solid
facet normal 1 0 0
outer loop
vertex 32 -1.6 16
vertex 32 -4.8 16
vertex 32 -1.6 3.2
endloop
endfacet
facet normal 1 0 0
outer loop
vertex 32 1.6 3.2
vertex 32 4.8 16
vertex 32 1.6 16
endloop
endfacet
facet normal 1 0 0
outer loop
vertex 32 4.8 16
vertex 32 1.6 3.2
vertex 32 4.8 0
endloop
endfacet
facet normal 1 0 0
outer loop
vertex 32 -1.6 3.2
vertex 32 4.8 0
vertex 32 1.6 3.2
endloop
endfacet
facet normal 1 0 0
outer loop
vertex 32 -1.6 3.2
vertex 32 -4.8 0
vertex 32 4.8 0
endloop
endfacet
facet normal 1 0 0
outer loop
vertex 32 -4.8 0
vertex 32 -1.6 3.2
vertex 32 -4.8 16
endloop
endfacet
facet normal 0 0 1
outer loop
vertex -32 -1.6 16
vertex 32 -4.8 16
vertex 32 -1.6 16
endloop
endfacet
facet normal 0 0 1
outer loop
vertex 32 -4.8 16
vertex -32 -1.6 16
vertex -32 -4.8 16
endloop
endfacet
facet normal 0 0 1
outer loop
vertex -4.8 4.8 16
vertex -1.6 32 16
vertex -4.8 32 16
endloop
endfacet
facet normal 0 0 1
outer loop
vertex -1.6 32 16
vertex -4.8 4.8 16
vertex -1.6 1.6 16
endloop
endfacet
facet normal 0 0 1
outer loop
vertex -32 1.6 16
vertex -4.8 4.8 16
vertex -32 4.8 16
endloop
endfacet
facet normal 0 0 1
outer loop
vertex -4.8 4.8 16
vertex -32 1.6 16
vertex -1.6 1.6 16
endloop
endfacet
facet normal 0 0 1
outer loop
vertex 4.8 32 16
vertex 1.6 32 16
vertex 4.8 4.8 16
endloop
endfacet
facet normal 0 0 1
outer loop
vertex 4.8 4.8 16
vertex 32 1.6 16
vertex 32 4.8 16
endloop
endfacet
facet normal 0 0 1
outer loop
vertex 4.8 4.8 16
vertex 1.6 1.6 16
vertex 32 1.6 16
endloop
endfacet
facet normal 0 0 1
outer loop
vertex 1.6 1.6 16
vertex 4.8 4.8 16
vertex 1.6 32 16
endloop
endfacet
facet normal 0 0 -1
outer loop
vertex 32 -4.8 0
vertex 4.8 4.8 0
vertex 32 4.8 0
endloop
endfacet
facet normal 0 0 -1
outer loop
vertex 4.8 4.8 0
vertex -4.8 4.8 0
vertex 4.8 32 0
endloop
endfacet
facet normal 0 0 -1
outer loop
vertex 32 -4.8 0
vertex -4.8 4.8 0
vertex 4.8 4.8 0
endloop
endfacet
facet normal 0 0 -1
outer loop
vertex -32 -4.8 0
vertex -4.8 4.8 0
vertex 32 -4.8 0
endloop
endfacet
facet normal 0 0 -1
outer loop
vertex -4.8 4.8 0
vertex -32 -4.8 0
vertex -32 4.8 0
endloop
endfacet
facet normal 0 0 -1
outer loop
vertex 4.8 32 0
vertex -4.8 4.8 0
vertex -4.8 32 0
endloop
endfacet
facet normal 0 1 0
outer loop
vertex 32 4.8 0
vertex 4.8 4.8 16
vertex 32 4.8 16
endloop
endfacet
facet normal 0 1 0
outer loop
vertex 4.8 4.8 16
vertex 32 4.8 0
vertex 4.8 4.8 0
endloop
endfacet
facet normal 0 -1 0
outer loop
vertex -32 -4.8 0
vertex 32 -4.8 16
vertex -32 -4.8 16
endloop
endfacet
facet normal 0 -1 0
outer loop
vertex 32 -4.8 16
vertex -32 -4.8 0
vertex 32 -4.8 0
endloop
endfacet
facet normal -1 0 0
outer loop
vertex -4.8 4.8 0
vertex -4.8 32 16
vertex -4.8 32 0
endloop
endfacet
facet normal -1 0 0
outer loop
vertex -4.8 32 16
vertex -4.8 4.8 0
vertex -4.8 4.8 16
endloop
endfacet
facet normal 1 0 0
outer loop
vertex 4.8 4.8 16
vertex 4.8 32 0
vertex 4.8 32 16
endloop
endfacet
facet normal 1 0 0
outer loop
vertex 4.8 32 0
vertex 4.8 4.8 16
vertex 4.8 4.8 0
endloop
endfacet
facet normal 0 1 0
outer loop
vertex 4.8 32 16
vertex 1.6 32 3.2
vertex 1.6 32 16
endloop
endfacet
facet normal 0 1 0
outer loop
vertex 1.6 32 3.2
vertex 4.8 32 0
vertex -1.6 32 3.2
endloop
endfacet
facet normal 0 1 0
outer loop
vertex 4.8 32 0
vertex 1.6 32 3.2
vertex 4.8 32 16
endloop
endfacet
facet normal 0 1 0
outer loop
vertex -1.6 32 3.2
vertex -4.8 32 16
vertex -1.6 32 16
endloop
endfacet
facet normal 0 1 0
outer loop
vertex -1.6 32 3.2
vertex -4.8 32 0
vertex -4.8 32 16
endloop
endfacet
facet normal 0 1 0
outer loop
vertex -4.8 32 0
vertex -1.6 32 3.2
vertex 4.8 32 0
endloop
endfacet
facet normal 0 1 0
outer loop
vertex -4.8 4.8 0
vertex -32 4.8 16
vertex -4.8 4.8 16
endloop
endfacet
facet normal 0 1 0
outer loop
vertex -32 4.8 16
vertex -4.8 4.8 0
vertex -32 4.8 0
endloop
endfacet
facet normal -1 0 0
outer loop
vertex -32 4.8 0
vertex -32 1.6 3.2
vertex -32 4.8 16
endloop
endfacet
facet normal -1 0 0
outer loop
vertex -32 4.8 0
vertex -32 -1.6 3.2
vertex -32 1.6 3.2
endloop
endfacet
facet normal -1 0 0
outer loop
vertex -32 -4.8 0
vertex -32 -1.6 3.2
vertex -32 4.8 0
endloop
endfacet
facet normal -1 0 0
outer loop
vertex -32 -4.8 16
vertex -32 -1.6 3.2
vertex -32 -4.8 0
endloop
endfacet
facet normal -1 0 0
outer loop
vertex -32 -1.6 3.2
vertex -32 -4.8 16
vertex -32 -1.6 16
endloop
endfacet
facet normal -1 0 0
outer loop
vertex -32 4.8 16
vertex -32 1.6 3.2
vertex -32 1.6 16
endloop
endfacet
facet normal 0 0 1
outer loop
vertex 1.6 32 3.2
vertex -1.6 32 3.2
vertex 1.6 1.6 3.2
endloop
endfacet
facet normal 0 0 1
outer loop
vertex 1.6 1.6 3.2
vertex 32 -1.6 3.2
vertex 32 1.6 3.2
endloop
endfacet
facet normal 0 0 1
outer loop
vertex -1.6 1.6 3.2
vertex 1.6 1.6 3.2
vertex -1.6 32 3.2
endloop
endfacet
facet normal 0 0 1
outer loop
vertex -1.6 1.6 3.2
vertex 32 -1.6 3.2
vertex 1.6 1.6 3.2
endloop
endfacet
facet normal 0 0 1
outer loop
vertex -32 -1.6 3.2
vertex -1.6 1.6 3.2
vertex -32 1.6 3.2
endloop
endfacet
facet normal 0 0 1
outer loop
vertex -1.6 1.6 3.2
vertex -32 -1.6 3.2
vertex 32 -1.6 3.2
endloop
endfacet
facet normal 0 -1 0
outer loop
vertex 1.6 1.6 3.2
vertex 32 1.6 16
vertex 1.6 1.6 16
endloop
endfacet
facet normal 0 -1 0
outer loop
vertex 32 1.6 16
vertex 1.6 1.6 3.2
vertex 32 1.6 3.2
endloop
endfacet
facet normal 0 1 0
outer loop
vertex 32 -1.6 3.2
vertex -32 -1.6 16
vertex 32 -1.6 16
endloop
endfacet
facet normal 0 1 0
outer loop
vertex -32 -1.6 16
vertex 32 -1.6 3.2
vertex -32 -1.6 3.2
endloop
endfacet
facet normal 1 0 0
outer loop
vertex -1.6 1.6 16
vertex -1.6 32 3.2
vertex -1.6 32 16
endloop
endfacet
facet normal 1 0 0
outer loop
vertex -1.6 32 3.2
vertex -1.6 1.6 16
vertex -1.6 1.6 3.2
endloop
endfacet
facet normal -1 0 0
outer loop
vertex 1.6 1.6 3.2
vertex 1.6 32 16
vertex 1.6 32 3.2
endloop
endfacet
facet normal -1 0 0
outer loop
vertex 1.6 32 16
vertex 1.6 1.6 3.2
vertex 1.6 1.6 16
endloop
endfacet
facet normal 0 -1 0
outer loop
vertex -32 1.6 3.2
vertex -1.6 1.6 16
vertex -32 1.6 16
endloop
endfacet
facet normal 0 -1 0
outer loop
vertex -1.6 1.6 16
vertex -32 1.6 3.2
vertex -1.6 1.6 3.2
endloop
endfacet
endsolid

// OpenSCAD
$fn = $preview ? 16 : 64;

module partition_connector(sides, thickness = 3, height = 0, length = 0) {
        assert(sides == 1 || sides == 2 || sides == 3 || sides == 4, "Invalid number of sides");

        height = height ? height : 5*thickness;
        length = length ? length : 10*thickness;

        difference() {
                union() {
                        for (i = [0:sides-1]) {
                                rotate([0, 0, 90*i])
                                        translate([0, -3*thickness/2, 0])
                                        cube([length, 3*thickness, height]);
                        }
                }
                for (i = [0:sides-1]) {
                        rotate([0, 0, 90*i])
                                translate([0, -thickness/2, thickness])
                                cube([length, thickness, height]);
                }
        }
}

partition_connector(3, thickness = 3.2);
